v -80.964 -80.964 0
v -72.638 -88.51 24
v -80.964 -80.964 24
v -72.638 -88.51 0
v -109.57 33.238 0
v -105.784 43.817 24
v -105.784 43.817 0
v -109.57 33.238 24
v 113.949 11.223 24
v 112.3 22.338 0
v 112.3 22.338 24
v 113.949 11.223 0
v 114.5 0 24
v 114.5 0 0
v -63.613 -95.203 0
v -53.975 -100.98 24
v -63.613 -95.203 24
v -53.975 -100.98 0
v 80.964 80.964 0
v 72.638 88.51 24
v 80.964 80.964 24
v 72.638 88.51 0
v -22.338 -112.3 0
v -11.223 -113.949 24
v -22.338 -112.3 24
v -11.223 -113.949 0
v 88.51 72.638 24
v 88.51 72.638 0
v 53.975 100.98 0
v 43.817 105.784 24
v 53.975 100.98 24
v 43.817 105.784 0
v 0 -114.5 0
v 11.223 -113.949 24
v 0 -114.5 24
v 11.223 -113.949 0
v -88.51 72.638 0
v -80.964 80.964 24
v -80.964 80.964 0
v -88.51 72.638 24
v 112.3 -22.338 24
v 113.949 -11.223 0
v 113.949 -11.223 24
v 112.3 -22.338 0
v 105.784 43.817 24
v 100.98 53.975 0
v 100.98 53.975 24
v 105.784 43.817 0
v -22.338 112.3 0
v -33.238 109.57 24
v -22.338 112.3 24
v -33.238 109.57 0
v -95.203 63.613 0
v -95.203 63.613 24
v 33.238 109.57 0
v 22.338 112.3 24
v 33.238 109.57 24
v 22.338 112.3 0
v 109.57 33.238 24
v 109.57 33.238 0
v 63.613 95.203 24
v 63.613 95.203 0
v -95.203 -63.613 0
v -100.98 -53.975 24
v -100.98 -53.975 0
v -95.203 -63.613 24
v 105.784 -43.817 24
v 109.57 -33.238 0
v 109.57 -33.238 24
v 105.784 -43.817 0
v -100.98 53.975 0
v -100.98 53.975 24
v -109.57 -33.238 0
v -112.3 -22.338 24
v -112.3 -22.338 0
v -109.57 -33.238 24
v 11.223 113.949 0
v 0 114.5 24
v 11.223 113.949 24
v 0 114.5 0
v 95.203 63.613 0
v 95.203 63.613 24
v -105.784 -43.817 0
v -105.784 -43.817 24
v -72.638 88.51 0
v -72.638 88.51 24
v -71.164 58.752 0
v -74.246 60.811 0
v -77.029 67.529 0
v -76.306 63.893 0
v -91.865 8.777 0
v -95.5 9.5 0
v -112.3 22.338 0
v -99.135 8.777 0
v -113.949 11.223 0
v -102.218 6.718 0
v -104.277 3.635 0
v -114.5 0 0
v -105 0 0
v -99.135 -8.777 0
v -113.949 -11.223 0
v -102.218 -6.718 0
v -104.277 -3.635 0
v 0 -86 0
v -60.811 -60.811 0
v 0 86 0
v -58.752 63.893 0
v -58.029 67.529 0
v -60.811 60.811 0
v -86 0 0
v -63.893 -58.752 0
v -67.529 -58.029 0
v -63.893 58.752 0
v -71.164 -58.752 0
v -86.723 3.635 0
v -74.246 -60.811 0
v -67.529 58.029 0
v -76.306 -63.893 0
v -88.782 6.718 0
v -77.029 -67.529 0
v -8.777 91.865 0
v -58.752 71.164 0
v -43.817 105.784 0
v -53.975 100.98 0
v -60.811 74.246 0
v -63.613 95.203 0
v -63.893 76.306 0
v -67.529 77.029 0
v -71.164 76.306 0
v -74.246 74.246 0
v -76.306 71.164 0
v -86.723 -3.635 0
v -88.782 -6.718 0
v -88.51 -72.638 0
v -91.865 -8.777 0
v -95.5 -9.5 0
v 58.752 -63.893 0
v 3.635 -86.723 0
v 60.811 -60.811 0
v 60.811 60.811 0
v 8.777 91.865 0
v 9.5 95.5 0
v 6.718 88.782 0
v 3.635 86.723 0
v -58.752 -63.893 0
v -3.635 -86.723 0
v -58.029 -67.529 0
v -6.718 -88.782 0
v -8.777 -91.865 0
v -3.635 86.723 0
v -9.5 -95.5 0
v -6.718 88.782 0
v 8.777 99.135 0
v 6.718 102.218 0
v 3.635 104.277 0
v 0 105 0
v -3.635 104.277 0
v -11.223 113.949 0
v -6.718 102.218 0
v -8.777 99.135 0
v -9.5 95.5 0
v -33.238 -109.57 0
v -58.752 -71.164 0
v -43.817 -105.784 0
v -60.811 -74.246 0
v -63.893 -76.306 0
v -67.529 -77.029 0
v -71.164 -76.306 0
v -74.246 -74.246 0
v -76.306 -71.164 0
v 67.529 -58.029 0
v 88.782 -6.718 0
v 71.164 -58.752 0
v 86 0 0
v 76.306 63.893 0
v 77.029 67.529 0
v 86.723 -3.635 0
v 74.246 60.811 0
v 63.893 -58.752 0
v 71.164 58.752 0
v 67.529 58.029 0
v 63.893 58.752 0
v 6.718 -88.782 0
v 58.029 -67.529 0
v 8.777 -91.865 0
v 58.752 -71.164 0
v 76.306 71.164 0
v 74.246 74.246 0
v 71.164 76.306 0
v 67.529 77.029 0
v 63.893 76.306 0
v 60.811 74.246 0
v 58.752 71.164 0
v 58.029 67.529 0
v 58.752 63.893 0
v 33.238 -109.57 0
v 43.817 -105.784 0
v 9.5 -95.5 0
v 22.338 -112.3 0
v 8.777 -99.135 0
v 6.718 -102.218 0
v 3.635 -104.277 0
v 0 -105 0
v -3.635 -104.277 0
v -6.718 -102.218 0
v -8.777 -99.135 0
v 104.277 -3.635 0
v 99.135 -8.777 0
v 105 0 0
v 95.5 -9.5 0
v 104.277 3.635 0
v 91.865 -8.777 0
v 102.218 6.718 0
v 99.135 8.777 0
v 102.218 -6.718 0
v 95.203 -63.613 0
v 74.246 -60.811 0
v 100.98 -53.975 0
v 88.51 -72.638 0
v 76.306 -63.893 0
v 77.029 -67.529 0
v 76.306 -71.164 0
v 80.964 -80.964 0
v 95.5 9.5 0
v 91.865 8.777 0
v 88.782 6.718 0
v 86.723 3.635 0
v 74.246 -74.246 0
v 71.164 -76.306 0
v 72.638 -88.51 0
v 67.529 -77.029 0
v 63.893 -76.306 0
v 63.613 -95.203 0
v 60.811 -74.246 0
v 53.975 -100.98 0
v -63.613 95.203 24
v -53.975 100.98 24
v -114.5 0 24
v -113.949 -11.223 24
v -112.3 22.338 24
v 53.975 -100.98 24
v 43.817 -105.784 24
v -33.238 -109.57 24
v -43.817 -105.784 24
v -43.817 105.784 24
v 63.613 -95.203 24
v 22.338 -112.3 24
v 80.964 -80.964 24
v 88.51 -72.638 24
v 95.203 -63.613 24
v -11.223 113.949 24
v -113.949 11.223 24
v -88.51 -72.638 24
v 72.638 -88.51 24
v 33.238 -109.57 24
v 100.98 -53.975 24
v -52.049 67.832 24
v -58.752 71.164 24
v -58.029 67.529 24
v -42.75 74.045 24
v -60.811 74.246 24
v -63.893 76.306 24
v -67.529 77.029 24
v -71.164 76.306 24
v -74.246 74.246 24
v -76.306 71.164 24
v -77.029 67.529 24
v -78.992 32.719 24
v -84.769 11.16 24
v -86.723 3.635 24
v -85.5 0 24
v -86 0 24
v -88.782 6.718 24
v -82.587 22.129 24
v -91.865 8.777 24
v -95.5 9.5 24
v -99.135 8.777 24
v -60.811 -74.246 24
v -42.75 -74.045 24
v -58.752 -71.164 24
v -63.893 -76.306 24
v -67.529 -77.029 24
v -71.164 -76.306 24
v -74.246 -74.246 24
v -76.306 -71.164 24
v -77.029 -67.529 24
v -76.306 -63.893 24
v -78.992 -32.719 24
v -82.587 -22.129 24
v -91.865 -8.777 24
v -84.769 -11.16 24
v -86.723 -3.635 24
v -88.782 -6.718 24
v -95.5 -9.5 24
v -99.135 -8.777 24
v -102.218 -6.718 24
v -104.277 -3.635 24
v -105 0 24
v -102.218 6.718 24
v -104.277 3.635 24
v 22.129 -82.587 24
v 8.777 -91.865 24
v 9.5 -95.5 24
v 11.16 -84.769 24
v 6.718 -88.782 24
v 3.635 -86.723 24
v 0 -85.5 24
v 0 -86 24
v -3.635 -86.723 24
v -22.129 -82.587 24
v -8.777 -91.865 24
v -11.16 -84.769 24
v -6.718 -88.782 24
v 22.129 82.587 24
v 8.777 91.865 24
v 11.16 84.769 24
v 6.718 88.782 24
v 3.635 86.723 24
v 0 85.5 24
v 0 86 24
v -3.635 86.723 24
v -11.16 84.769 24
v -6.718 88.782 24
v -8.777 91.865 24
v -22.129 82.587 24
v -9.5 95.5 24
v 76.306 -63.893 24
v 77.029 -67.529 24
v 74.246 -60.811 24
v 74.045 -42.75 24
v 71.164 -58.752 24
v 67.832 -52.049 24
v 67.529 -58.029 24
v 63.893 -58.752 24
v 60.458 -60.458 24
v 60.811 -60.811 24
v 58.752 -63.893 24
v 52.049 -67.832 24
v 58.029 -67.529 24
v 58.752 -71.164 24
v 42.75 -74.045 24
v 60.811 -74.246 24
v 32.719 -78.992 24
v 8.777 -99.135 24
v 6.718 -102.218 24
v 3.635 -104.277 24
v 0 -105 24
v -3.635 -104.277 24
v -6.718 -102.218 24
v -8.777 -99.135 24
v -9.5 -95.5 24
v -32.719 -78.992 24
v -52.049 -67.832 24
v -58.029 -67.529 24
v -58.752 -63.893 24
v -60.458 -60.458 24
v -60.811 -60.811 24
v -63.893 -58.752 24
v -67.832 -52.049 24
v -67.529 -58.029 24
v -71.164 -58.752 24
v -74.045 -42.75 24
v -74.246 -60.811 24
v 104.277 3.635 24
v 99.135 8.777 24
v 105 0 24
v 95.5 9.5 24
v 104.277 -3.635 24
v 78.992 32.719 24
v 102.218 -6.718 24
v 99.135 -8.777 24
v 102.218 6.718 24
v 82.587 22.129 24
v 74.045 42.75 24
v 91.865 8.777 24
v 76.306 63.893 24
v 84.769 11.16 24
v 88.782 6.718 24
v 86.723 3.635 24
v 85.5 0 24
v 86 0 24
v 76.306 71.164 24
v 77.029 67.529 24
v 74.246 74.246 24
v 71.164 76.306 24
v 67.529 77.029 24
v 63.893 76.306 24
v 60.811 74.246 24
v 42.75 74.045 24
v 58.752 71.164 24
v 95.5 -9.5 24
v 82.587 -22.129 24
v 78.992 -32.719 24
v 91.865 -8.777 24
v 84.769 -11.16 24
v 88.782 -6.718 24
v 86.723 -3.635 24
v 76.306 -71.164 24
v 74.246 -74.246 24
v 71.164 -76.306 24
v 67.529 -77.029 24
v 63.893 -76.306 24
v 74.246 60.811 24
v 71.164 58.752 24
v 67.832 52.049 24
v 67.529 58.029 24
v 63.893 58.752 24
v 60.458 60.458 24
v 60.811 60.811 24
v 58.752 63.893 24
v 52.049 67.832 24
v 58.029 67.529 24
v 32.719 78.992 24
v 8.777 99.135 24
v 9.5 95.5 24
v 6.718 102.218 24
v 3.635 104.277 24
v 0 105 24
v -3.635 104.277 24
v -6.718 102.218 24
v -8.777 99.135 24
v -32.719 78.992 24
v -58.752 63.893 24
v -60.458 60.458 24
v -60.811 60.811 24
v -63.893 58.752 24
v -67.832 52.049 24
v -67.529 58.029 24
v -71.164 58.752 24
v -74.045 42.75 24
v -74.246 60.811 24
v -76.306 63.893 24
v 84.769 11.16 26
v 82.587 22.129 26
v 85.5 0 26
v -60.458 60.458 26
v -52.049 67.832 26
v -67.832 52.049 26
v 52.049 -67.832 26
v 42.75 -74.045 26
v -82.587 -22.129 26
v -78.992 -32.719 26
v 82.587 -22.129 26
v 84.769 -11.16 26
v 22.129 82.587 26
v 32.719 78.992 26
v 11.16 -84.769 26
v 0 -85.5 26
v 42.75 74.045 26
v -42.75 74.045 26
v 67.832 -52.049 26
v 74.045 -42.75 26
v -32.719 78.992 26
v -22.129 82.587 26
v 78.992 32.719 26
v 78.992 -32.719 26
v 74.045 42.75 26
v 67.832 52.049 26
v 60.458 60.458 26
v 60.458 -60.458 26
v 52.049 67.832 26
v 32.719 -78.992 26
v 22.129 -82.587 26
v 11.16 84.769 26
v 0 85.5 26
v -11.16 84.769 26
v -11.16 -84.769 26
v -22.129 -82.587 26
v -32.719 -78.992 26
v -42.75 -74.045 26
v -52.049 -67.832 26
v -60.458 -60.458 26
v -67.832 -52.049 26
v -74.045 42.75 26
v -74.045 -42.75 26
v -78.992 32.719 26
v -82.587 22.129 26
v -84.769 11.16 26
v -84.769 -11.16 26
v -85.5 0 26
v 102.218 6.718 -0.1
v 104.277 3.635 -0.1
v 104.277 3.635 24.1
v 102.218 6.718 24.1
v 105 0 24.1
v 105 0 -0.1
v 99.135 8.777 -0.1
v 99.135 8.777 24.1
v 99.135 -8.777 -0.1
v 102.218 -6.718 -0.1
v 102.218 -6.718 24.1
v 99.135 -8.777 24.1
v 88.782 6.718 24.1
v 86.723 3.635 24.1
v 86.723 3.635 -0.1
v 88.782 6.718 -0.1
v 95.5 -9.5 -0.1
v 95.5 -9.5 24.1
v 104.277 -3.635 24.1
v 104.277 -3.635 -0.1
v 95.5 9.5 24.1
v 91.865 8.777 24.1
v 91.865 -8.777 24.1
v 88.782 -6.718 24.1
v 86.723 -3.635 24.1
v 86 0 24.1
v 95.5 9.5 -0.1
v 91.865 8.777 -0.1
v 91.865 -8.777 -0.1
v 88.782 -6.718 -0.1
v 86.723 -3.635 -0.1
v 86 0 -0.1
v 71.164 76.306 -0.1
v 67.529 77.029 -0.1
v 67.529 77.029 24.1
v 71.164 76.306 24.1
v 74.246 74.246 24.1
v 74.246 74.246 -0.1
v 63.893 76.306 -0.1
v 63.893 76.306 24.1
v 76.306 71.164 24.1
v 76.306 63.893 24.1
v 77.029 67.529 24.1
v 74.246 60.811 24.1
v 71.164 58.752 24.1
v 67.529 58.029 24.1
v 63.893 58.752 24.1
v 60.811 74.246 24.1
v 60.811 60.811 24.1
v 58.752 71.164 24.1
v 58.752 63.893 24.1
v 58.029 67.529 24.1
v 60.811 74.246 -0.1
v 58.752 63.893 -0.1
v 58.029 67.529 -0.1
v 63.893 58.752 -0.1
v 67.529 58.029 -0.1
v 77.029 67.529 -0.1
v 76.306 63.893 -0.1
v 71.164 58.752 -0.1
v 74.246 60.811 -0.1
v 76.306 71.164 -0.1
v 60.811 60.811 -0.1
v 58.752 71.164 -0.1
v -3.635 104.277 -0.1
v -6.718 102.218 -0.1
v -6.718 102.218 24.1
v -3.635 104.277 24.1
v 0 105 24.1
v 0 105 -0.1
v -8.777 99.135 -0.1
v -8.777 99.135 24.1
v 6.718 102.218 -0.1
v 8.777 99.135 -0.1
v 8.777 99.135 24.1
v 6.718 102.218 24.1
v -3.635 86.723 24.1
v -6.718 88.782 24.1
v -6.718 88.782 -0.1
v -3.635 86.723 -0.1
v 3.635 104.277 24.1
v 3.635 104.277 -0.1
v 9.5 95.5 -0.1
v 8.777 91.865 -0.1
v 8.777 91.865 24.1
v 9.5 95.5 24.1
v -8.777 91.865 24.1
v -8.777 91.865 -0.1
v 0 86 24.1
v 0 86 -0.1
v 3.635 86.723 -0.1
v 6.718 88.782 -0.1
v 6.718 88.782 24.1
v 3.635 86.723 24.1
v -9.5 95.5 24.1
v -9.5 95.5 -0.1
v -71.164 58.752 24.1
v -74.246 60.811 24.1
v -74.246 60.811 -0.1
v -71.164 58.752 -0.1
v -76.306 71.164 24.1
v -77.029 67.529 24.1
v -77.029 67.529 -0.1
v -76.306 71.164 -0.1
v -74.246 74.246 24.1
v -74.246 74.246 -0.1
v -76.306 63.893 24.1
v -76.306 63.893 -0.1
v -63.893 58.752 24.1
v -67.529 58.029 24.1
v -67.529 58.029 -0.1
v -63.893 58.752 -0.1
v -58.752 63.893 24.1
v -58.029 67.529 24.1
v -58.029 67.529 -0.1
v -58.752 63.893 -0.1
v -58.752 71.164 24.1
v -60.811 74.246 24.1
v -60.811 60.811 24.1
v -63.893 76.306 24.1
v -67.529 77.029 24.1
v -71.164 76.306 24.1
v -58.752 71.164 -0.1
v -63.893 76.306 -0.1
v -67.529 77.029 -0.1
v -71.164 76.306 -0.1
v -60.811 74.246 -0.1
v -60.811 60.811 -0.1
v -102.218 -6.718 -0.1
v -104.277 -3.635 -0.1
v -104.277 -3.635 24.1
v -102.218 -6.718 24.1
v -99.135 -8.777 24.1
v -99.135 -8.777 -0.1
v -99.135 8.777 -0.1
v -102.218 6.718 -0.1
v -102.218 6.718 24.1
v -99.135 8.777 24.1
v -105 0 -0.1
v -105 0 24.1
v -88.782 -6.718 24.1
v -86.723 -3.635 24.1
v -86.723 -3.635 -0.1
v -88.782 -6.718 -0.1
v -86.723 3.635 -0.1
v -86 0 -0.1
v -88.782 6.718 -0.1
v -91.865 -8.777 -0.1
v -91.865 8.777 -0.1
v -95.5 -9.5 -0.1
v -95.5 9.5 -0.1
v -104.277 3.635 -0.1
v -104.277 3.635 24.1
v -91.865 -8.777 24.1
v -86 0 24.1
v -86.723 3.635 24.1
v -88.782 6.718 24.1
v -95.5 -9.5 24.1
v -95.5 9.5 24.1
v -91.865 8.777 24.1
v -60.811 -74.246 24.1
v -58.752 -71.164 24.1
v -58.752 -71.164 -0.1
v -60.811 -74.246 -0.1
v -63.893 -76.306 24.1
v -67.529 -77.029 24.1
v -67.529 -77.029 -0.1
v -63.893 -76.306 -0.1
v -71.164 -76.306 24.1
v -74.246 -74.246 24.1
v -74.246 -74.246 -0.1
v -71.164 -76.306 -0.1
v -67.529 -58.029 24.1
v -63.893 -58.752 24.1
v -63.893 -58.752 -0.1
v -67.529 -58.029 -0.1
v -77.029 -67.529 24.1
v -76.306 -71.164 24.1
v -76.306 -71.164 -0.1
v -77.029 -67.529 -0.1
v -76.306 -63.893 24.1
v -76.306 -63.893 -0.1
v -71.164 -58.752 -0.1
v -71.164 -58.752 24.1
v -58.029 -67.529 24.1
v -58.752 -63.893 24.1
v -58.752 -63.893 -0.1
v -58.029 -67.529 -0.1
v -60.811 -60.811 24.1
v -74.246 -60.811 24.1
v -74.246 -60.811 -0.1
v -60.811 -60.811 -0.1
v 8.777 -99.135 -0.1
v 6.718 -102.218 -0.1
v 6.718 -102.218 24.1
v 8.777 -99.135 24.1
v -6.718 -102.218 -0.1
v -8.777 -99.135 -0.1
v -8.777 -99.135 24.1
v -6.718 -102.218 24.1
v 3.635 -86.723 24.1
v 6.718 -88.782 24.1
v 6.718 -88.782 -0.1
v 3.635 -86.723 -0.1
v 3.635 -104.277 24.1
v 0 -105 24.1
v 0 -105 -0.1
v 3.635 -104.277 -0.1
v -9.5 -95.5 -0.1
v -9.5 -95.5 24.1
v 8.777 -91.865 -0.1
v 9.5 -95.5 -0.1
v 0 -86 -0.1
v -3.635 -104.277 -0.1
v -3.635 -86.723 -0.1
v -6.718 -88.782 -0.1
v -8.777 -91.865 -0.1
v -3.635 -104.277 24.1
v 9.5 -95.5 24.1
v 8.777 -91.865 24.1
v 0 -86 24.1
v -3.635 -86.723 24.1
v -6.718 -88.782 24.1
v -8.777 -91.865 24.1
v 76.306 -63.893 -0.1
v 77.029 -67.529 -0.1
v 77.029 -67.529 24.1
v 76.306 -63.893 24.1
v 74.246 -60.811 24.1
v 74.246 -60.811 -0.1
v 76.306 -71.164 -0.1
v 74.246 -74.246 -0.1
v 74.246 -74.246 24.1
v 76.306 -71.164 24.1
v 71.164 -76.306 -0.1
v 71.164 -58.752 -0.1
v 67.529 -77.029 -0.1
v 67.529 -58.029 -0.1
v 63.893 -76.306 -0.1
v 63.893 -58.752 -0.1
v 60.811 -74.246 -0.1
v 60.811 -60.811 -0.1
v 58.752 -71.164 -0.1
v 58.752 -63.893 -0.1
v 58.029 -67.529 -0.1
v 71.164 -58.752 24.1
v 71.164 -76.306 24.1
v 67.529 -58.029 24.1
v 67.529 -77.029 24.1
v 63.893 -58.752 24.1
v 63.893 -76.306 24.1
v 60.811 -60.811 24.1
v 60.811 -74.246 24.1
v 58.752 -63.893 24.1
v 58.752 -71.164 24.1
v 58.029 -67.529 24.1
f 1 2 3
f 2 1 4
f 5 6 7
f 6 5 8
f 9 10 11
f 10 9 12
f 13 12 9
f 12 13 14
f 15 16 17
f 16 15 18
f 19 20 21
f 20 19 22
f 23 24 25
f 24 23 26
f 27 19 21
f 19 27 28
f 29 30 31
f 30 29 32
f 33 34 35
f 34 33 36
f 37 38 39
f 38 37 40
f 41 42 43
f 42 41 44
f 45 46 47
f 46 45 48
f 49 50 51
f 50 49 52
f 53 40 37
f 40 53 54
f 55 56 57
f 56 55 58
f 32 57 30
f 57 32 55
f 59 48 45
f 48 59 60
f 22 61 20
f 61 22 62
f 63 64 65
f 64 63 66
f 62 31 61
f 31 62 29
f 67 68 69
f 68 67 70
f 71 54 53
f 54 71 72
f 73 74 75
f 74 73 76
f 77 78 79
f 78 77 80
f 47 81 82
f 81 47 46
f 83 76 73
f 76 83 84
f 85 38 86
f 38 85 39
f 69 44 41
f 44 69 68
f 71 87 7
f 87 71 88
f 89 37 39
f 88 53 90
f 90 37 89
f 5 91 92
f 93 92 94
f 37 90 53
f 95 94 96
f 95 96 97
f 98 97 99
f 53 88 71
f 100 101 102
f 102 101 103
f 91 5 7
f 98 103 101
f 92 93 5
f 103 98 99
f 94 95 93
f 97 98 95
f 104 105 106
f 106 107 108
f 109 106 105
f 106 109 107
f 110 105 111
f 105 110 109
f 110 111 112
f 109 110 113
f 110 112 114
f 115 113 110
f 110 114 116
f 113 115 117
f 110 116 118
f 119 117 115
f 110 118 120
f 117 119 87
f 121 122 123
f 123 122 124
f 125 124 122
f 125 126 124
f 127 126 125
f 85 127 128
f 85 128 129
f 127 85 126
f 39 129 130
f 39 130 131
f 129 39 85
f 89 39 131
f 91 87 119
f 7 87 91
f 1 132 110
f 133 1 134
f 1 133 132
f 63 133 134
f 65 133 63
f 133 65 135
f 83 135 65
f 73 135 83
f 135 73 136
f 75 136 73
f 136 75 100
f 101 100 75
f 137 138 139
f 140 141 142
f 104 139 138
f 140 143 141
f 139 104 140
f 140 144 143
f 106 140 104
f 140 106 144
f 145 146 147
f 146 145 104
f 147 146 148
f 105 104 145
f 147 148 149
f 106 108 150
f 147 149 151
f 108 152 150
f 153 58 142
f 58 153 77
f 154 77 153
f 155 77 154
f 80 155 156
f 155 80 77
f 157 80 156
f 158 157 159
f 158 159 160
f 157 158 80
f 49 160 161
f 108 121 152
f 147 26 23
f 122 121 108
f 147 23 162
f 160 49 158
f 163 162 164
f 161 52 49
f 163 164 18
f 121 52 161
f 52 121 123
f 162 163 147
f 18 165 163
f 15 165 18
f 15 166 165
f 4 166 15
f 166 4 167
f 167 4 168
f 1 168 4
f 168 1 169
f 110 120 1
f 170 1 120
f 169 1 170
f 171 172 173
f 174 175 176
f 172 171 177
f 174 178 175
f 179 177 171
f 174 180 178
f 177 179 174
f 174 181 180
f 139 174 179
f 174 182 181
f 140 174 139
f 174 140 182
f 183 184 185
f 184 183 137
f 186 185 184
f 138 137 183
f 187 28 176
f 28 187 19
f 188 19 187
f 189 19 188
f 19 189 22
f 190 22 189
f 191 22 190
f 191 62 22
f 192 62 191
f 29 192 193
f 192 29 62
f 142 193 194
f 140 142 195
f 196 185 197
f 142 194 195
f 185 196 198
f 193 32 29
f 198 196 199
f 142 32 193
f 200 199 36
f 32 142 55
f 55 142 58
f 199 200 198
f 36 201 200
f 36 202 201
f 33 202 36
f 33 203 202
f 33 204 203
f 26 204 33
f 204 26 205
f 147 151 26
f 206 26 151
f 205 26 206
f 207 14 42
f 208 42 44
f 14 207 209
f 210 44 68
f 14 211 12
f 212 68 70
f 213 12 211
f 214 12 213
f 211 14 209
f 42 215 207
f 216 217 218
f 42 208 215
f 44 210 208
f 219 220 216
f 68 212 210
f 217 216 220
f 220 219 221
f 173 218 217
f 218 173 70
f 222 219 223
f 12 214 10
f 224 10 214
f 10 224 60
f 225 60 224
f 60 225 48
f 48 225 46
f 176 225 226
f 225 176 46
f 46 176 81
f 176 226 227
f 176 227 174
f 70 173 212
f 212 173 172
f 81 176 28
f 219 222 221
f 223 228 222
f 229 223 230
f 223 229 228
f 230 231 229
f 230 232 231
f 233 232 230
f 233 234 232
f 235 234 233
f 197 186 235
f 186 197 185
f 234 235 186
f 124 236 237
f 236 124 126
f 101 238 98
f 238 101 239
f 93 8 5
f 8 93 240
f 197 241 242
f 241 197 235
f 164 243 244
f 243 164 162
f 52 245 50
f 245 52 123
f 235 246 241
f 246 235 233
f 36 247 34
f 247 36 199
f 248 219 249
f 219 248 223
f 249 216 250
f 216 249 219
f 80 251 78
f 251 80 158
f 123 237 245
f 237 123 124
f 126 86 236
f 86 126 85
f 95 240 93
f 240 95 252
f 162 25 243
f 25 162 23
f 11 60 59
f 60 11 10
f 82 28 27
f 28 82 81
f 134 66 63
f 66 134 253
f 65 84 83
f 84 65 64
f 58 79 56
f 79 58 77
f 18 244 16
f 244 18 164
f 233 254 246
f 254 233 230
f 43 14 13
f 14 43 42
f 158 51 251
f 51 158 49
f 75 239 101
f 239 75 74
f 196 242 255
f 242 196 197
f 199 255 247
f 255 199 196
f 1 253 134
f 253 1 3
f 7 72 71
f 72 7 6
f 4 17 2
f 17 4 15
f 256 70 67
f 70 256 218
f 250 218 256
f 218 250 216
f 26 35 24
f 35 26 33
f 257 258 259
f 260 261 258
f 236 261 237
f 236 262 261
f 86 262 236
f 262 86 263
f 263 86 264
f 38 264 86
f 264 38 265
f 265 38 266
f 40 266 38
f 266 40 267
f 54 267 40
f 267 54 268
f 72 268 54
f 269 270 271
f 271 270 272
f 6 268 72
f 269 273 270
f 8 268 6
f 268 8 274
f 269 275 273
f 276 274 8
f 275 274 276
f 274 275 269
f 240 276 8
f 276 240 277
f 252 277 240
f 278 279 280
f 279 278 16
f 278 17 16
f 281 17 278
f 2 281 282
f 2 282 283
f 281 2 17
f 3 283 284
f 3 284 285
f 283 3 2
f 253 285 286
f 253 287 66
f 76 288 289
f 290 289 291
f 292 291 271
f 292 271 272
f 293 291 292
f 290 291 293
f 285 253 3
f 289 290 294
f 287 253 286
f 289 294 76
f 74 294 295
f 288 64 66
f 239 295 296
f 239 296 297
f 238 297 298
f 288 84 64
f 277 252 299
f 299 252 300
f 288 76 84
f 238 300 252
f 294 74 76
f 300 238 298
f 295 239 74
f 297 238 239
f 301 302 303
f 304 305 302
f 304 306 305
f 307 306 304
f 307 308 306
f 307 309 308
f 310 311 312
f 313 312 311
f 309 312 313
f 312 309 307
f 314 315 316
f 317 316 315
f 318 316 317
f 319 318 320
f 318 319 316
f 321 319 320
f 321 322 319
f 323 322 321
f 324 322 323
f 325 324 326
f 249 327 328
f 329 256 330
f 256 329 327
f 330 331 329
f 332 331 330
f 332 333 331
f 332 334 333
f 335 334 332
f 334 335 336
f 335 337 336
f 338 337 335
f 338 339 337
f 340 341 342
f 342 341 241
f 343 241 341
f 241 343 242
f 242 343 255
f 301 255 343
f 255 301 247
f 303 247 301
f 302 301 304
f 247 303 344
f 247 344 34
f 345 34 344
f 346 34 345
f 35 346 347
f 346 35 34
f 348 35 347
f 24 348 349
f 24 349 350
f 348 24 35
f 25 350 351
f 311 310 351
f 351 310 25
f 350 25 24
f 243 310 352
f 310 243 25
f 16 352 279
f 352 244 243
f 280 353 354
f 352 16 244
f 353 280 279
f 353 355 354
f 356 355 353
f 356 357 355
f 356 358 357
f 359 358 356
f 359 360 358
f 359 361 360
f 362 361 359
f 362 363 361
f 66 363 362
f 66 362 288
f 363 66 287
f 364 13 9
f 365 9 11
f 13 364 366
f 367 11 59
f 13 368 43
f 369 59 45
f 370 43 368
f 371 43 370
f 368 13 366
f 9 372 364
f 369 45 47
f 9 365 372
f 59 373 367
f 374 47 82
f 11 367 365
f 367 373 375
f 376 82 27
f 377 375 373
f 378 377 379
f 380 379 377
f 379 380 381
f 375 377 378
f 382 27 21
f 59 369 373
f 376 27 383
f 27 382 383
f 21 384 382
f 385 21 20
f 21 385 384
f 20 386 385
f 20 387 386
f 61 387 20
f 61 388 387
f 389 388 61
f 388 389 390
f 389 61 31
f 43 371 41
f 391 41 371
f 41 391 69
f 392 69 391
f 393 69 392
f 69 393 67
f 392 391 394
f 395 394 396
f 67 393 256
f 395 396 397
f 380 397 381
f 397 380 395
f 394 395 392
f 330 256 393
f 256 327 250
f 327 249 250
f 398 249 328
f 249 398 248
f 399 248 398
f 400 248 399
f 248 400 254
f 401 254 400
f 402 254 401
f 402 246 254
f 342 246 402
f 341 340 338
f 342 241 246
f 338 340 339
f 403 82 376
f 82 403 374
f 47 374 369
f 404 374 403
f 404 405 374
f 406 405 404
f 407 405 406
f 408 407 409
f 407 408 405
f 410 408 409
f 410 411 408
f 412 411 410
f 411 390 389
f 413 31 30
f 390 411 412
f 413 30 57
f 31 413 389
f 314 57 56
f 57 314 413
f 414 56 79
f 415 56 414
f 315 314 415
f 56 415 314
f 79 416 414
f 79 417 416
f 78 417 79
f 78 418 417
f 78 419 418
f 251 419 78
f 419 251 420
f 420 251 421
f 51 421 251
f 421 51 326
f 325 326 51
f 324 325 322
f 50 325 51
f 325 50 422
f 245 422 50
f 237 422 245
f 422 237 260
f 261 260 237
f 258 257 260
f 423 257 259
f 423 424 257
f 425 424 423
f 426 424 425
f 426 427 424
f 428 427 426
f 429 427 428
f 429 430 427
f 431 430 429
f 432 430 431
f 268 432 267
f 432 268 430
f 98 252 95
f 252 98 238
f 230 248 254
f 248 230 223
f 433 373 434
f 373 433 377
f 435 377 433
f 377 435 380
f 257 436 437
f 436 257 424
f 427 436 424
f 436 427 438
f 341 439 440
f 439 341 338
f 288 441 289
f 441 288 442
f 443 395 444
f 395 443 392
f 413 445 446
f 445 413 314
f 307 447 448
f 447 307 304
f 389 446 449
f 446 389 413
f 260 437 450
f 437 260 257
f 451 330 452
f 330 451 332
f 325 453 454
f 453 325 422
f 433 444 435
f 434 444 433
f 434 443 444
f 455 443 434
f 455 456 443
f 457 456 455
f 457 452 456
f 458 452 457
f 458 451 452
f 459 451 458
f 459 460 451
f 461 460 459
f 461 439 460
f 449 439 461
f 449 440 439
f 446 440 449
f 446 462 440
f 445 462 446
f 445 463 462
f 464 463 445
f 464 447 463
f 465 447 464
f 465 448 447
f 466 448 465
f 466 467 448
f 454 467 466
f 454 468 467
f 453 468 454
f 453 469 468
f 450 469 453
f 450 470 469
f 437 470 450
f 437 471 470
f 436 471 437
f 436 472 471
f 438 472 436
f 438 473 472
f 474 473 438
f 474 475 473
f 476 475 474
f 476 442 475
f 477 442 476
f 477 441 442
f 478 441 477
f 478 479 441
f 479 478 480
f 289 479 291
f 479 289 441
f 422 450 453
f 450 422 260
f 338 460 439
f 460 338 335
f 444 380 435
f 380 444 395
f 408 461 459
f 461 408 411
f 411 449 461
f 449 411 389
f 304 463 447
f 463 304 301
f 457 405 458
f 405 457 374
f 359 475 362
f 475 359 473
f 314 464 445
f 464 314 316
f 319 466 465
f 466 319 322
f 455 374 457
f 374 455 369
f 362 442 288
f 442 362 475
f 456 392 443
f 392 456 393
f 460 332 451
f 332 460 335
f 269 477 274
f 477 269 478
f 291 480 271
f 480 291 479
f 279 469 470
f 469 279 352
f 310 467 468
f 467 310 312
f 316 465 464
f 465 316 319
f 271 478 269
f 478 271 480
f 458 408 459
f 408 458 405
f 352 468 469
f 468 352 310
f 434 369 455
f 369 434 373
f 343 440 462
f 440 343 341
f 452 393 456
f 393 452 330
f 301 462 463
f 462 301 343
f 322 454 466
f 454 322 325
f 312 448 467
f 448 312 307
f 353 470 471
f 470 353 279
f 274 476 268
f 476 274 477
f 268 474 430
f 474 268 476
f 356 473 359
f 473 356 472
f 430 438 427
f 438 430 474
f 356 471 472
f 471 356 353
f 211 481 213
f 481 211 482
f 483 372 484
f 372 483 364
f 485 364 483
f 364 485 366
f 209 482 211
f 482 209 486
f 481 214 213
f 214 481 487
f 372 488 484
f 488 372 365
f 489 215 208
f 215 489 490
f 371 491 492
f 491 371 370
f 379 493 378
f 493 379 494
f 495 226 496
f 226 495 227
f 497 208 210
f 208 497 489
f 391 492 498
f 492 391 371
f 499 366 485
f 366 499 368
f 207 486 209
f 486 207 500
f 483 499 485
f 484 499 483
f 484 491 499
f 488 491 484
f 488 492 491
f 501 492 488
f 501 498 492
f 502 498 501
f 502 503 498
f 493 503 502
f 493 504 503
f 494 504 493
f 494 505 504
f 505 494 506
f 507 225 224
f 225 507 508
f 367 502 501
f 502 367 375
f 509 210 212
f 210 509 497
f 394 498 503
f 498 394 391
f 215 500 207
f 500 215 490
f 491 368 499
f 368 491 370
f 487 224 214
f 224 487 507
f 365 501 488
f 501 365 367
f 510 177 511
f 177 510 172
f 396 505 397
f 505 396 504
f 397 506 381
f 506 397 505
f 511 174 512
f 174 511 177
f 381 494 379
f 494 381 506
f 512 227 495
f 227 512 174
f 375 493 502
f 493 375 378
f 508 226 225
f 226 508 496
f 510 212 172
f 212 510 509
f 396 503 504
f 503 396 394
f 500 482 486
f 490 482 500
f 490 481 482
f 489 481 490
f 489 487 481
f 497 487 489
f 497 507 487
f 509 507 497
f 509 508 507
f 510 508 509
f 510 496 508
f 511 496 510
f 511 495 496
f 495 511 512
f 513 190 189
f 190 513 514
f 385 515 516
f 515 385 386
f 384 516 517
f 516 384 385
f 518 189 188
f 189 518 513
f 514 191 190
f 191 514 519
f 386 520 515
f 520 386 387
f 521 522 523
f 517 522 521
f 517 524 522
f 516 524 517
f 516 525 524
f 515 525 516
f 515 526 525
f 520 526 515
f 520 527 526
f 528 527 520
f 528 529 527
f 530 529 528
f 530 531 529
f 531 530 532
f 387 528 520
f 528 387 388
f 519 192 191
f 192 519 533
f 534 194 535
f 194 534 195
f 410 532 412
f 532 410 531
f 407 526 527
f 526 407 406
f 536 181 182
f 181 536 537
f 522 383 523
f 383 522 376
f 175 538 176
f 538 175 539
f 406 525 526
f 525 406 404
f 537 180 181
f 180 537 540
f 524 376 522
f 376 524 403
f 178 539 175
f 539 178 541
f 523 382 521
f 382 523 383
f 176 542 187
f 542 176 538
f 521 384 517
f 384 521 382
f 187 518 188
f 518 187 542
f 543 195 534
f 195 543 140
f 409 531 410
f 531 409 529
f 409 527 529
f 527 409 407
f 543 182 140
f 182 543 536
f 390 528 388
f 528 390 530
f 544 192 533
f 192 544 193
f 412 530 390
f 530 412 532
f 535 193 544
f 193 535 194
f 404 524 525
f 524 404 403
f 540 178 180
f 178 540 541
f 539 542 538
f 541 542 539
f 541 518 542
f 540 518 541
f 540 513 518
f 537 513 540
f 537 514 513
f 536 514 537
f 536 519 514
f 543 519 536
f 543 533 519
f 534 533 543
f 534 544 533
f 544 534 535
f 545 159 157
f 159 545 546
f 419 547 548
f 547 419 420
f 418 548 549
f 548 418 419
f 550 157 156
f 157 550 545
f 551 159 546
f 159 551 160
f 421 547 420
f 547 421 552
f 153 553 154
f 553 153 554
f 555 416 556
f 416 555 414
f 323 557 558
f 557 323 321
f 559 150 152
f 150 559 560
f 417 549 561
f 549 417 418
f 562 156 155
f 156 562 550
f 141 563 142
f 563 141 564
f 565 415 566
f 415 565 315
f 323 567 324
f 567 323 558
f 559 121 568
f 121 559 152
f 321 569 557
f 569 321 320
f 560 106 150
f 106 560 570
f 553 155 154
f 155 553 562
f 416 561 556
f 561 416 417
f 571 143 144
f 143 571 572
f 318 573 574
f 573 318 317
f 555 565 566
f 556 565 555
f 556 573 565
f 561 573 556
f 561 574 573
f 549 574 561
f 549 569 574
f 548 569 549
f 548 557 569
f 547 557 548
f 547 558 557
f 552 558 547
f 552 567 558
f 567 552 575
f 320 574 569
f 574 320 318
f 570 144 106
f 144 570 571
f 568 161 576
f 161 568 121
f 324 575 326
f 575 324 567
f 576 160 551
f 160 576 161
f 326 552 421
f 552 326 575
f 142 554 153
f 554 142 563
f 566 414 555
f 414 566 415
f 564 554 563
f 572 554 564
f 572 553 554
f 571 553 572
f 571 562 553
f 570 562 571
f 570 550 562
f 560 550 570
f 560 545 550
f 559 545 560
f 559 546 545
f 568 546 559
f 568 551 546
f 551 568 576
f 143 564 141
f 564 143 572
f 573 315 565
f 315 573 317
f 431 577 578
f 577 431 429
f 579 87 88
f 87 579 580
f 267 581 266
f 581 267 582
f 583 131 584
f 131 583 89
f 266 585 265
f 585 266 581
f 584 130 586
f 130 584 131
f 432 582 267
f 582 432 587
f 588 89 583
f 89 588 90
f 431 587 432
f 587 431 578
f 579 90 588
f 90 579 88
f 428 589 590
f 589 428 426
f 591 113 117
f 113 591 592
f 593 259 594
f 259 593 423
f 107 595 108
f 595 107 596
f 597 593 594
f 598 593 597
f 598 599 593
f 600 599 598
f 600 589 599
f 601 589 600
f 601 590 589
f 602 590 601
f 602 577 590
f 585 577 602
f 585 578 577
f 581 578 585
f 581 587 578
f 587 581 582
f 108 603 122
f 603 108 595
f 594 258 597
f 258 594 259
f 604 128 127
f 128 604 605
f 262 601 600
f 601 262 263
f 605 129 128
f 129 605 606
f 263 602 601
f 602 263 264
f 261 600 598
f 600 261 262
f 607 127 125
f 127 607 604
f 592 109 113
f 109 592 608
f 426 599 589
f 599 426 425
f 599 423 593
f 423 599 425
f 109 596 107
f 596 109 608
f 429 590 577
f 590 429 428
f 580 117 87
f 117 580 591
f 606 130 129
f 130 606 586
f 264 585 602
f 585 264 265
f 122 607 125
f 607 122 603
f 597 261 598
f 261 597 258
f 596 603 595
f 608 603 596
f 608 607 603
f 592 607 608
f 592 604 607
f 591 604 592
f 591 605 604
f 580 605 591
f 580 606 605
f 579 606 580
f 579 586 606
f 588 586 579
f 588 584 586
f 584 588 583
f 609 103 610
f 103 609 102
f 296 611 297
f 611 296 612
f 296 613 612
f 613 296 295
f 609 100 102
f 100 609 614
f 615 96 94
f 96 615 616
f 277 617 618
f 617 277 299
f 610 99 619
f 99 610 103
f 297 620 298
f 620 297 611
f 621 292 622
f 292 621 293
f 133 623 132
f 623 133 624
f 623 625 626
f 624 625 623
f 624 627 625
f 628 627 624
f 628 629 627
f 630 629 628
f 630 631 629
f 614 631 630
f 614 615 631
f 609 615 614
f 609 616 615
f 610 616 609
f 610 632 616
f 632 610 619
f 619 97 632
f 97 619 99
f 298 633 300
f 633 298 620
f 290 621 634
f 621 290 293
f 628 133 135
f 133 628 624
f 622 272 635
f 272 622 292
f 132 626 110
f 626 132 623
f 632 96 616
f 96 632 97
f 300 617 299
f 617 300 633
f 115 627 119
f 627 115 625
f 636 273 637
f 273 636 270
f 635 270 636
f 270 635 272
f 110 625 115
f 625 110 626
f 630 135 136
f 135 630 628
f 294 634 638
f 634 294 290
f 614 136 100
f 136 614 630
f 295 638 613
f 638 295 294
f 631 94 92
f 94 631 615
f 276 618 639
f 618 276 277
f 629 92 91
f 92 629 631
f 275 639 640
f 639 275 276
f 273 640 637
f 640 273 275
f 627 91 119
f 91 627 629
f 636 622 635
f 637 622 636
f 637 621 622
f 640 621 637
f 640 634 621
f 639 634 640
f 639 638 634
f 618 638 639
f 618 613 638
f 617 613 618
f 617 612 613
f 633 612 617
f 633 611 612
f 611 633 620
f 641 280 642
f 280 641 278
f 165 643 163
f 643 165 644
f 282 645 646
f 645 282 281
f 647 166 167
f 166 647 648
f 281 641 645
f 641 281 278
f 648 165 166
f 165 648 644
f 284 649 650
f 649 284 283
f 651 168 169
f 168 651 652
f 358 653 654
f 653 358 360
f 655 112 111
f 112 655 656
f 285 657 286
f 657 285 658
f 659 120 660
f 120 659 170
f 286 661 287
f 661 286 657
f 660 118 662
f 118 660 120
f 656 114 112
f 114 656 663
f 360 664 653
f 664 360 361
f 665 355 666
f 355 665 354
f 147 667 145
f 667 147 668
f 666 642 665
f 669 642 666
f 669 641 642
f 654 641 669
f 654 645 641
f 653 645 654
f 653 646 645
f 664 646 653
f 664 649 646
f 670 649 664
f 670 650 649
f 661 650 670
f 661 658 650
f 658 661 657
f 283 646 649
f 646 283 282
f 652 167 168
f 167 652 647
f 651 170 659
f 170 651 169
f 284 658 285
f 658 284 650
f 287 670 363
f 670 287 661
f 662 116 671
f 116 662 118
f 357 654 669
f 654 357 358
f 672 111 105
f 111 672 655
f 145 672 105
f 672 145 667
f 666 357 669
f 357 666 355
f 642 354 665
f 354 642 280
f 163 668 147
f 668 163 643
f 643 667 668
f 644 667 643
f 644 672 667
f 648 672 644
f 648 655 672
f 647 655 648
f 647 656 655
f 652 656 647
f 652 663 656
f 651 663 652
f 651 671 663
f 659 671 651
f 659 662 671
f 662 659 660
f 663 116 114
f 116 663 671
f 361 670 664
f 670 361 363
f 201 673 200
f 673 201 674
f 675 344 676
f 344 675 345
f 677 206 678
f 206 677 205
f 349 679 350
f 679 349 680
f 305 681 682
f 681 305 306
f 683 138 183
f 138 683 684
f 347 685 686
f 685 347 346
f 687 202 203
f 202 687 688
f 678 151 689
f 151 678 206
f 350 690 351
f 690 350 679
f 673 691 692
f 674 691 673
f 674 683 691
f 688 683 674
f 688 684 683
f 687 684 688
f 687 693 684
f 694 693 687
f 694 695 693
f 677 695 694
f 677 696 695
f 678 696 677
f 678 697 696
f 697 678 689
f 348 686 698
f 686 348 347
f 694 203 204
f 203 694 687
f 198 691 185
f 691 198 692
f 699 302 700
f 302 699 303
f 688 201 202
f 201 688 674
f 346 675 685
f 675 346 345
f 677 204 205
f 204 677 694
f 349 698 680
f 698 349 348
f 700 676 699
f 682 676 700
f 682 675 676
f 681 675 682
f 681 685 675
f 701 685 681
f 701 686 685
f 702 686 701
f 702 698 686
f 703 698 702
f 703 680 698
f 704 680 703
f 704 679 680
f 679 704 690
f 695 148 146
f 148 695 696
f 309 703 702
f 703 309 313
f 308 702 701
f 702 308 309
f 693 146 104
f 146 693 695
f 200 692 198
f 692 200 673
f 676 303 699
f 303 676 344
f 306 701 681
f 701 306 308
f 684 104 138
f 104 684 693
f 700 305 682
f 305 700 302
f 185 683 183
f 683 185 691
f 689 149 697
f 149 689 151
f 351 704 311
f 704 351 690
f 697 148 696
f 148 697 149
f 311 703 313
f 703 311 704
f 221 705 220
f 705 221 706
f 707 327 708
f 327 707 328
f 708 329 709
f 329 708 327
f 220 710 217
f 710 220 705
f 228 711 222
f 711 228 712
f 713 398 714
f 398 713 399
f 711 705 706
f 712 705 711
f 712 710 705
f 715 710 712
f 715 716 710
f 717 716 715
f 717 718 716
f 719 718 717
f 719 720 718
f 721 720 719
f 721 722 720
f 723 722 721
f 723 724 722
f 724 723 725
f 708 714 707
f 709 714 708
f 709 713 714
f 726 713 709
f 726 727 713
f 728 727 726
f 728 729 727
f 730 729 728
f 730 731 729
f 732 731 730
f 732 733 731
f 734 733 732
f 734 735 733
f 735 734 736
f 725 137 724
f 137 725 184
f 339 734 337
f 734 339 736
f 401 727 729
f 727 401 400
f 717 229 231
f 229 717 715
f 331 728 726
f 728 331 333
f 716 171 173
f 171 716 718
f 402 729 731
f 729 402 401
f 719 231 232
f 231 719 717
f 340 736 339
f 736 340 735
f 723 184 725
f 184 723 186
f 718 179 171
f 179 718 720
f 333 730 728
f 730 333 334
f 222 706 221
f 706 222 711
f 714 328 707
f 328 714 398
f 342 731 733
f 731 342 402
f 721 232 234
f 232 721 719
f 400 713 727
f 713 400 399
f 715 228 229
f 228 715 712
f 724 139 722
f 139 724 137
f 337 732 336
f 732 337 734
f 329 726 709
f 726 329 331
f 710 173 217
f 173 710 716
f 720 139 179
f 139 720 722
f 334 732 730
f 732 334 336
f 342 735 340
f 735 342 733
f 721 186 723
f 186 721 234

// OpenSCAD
// 150# ANSI raised-face flange, 4" NPS.
flange_od = 229;
flange_t = 24;
raised_d = 171;
raised_h = 2;
pipe_od = 114.3;  // 4" NPS
bolt_pcd = 191;
bolt_d = 19;       // 3/4" bolts
union() {
    cylinder(h = flange_t, d = flange_od, $fn = 64);
    translate([0, 0, flange_t])
        cylinder(h = raised_h, d = raised_d, $fn = 48);
    // Central bore (subtracted)
}
// 8 bolt holes
for (i = [0:7]) rotate([0, 0, i * 45])
    translate([bolt_pcd / 2, 0, -0.1])
        cylinder(h = flange_t + 0.2, d = bolt_d, $fn = 16);
